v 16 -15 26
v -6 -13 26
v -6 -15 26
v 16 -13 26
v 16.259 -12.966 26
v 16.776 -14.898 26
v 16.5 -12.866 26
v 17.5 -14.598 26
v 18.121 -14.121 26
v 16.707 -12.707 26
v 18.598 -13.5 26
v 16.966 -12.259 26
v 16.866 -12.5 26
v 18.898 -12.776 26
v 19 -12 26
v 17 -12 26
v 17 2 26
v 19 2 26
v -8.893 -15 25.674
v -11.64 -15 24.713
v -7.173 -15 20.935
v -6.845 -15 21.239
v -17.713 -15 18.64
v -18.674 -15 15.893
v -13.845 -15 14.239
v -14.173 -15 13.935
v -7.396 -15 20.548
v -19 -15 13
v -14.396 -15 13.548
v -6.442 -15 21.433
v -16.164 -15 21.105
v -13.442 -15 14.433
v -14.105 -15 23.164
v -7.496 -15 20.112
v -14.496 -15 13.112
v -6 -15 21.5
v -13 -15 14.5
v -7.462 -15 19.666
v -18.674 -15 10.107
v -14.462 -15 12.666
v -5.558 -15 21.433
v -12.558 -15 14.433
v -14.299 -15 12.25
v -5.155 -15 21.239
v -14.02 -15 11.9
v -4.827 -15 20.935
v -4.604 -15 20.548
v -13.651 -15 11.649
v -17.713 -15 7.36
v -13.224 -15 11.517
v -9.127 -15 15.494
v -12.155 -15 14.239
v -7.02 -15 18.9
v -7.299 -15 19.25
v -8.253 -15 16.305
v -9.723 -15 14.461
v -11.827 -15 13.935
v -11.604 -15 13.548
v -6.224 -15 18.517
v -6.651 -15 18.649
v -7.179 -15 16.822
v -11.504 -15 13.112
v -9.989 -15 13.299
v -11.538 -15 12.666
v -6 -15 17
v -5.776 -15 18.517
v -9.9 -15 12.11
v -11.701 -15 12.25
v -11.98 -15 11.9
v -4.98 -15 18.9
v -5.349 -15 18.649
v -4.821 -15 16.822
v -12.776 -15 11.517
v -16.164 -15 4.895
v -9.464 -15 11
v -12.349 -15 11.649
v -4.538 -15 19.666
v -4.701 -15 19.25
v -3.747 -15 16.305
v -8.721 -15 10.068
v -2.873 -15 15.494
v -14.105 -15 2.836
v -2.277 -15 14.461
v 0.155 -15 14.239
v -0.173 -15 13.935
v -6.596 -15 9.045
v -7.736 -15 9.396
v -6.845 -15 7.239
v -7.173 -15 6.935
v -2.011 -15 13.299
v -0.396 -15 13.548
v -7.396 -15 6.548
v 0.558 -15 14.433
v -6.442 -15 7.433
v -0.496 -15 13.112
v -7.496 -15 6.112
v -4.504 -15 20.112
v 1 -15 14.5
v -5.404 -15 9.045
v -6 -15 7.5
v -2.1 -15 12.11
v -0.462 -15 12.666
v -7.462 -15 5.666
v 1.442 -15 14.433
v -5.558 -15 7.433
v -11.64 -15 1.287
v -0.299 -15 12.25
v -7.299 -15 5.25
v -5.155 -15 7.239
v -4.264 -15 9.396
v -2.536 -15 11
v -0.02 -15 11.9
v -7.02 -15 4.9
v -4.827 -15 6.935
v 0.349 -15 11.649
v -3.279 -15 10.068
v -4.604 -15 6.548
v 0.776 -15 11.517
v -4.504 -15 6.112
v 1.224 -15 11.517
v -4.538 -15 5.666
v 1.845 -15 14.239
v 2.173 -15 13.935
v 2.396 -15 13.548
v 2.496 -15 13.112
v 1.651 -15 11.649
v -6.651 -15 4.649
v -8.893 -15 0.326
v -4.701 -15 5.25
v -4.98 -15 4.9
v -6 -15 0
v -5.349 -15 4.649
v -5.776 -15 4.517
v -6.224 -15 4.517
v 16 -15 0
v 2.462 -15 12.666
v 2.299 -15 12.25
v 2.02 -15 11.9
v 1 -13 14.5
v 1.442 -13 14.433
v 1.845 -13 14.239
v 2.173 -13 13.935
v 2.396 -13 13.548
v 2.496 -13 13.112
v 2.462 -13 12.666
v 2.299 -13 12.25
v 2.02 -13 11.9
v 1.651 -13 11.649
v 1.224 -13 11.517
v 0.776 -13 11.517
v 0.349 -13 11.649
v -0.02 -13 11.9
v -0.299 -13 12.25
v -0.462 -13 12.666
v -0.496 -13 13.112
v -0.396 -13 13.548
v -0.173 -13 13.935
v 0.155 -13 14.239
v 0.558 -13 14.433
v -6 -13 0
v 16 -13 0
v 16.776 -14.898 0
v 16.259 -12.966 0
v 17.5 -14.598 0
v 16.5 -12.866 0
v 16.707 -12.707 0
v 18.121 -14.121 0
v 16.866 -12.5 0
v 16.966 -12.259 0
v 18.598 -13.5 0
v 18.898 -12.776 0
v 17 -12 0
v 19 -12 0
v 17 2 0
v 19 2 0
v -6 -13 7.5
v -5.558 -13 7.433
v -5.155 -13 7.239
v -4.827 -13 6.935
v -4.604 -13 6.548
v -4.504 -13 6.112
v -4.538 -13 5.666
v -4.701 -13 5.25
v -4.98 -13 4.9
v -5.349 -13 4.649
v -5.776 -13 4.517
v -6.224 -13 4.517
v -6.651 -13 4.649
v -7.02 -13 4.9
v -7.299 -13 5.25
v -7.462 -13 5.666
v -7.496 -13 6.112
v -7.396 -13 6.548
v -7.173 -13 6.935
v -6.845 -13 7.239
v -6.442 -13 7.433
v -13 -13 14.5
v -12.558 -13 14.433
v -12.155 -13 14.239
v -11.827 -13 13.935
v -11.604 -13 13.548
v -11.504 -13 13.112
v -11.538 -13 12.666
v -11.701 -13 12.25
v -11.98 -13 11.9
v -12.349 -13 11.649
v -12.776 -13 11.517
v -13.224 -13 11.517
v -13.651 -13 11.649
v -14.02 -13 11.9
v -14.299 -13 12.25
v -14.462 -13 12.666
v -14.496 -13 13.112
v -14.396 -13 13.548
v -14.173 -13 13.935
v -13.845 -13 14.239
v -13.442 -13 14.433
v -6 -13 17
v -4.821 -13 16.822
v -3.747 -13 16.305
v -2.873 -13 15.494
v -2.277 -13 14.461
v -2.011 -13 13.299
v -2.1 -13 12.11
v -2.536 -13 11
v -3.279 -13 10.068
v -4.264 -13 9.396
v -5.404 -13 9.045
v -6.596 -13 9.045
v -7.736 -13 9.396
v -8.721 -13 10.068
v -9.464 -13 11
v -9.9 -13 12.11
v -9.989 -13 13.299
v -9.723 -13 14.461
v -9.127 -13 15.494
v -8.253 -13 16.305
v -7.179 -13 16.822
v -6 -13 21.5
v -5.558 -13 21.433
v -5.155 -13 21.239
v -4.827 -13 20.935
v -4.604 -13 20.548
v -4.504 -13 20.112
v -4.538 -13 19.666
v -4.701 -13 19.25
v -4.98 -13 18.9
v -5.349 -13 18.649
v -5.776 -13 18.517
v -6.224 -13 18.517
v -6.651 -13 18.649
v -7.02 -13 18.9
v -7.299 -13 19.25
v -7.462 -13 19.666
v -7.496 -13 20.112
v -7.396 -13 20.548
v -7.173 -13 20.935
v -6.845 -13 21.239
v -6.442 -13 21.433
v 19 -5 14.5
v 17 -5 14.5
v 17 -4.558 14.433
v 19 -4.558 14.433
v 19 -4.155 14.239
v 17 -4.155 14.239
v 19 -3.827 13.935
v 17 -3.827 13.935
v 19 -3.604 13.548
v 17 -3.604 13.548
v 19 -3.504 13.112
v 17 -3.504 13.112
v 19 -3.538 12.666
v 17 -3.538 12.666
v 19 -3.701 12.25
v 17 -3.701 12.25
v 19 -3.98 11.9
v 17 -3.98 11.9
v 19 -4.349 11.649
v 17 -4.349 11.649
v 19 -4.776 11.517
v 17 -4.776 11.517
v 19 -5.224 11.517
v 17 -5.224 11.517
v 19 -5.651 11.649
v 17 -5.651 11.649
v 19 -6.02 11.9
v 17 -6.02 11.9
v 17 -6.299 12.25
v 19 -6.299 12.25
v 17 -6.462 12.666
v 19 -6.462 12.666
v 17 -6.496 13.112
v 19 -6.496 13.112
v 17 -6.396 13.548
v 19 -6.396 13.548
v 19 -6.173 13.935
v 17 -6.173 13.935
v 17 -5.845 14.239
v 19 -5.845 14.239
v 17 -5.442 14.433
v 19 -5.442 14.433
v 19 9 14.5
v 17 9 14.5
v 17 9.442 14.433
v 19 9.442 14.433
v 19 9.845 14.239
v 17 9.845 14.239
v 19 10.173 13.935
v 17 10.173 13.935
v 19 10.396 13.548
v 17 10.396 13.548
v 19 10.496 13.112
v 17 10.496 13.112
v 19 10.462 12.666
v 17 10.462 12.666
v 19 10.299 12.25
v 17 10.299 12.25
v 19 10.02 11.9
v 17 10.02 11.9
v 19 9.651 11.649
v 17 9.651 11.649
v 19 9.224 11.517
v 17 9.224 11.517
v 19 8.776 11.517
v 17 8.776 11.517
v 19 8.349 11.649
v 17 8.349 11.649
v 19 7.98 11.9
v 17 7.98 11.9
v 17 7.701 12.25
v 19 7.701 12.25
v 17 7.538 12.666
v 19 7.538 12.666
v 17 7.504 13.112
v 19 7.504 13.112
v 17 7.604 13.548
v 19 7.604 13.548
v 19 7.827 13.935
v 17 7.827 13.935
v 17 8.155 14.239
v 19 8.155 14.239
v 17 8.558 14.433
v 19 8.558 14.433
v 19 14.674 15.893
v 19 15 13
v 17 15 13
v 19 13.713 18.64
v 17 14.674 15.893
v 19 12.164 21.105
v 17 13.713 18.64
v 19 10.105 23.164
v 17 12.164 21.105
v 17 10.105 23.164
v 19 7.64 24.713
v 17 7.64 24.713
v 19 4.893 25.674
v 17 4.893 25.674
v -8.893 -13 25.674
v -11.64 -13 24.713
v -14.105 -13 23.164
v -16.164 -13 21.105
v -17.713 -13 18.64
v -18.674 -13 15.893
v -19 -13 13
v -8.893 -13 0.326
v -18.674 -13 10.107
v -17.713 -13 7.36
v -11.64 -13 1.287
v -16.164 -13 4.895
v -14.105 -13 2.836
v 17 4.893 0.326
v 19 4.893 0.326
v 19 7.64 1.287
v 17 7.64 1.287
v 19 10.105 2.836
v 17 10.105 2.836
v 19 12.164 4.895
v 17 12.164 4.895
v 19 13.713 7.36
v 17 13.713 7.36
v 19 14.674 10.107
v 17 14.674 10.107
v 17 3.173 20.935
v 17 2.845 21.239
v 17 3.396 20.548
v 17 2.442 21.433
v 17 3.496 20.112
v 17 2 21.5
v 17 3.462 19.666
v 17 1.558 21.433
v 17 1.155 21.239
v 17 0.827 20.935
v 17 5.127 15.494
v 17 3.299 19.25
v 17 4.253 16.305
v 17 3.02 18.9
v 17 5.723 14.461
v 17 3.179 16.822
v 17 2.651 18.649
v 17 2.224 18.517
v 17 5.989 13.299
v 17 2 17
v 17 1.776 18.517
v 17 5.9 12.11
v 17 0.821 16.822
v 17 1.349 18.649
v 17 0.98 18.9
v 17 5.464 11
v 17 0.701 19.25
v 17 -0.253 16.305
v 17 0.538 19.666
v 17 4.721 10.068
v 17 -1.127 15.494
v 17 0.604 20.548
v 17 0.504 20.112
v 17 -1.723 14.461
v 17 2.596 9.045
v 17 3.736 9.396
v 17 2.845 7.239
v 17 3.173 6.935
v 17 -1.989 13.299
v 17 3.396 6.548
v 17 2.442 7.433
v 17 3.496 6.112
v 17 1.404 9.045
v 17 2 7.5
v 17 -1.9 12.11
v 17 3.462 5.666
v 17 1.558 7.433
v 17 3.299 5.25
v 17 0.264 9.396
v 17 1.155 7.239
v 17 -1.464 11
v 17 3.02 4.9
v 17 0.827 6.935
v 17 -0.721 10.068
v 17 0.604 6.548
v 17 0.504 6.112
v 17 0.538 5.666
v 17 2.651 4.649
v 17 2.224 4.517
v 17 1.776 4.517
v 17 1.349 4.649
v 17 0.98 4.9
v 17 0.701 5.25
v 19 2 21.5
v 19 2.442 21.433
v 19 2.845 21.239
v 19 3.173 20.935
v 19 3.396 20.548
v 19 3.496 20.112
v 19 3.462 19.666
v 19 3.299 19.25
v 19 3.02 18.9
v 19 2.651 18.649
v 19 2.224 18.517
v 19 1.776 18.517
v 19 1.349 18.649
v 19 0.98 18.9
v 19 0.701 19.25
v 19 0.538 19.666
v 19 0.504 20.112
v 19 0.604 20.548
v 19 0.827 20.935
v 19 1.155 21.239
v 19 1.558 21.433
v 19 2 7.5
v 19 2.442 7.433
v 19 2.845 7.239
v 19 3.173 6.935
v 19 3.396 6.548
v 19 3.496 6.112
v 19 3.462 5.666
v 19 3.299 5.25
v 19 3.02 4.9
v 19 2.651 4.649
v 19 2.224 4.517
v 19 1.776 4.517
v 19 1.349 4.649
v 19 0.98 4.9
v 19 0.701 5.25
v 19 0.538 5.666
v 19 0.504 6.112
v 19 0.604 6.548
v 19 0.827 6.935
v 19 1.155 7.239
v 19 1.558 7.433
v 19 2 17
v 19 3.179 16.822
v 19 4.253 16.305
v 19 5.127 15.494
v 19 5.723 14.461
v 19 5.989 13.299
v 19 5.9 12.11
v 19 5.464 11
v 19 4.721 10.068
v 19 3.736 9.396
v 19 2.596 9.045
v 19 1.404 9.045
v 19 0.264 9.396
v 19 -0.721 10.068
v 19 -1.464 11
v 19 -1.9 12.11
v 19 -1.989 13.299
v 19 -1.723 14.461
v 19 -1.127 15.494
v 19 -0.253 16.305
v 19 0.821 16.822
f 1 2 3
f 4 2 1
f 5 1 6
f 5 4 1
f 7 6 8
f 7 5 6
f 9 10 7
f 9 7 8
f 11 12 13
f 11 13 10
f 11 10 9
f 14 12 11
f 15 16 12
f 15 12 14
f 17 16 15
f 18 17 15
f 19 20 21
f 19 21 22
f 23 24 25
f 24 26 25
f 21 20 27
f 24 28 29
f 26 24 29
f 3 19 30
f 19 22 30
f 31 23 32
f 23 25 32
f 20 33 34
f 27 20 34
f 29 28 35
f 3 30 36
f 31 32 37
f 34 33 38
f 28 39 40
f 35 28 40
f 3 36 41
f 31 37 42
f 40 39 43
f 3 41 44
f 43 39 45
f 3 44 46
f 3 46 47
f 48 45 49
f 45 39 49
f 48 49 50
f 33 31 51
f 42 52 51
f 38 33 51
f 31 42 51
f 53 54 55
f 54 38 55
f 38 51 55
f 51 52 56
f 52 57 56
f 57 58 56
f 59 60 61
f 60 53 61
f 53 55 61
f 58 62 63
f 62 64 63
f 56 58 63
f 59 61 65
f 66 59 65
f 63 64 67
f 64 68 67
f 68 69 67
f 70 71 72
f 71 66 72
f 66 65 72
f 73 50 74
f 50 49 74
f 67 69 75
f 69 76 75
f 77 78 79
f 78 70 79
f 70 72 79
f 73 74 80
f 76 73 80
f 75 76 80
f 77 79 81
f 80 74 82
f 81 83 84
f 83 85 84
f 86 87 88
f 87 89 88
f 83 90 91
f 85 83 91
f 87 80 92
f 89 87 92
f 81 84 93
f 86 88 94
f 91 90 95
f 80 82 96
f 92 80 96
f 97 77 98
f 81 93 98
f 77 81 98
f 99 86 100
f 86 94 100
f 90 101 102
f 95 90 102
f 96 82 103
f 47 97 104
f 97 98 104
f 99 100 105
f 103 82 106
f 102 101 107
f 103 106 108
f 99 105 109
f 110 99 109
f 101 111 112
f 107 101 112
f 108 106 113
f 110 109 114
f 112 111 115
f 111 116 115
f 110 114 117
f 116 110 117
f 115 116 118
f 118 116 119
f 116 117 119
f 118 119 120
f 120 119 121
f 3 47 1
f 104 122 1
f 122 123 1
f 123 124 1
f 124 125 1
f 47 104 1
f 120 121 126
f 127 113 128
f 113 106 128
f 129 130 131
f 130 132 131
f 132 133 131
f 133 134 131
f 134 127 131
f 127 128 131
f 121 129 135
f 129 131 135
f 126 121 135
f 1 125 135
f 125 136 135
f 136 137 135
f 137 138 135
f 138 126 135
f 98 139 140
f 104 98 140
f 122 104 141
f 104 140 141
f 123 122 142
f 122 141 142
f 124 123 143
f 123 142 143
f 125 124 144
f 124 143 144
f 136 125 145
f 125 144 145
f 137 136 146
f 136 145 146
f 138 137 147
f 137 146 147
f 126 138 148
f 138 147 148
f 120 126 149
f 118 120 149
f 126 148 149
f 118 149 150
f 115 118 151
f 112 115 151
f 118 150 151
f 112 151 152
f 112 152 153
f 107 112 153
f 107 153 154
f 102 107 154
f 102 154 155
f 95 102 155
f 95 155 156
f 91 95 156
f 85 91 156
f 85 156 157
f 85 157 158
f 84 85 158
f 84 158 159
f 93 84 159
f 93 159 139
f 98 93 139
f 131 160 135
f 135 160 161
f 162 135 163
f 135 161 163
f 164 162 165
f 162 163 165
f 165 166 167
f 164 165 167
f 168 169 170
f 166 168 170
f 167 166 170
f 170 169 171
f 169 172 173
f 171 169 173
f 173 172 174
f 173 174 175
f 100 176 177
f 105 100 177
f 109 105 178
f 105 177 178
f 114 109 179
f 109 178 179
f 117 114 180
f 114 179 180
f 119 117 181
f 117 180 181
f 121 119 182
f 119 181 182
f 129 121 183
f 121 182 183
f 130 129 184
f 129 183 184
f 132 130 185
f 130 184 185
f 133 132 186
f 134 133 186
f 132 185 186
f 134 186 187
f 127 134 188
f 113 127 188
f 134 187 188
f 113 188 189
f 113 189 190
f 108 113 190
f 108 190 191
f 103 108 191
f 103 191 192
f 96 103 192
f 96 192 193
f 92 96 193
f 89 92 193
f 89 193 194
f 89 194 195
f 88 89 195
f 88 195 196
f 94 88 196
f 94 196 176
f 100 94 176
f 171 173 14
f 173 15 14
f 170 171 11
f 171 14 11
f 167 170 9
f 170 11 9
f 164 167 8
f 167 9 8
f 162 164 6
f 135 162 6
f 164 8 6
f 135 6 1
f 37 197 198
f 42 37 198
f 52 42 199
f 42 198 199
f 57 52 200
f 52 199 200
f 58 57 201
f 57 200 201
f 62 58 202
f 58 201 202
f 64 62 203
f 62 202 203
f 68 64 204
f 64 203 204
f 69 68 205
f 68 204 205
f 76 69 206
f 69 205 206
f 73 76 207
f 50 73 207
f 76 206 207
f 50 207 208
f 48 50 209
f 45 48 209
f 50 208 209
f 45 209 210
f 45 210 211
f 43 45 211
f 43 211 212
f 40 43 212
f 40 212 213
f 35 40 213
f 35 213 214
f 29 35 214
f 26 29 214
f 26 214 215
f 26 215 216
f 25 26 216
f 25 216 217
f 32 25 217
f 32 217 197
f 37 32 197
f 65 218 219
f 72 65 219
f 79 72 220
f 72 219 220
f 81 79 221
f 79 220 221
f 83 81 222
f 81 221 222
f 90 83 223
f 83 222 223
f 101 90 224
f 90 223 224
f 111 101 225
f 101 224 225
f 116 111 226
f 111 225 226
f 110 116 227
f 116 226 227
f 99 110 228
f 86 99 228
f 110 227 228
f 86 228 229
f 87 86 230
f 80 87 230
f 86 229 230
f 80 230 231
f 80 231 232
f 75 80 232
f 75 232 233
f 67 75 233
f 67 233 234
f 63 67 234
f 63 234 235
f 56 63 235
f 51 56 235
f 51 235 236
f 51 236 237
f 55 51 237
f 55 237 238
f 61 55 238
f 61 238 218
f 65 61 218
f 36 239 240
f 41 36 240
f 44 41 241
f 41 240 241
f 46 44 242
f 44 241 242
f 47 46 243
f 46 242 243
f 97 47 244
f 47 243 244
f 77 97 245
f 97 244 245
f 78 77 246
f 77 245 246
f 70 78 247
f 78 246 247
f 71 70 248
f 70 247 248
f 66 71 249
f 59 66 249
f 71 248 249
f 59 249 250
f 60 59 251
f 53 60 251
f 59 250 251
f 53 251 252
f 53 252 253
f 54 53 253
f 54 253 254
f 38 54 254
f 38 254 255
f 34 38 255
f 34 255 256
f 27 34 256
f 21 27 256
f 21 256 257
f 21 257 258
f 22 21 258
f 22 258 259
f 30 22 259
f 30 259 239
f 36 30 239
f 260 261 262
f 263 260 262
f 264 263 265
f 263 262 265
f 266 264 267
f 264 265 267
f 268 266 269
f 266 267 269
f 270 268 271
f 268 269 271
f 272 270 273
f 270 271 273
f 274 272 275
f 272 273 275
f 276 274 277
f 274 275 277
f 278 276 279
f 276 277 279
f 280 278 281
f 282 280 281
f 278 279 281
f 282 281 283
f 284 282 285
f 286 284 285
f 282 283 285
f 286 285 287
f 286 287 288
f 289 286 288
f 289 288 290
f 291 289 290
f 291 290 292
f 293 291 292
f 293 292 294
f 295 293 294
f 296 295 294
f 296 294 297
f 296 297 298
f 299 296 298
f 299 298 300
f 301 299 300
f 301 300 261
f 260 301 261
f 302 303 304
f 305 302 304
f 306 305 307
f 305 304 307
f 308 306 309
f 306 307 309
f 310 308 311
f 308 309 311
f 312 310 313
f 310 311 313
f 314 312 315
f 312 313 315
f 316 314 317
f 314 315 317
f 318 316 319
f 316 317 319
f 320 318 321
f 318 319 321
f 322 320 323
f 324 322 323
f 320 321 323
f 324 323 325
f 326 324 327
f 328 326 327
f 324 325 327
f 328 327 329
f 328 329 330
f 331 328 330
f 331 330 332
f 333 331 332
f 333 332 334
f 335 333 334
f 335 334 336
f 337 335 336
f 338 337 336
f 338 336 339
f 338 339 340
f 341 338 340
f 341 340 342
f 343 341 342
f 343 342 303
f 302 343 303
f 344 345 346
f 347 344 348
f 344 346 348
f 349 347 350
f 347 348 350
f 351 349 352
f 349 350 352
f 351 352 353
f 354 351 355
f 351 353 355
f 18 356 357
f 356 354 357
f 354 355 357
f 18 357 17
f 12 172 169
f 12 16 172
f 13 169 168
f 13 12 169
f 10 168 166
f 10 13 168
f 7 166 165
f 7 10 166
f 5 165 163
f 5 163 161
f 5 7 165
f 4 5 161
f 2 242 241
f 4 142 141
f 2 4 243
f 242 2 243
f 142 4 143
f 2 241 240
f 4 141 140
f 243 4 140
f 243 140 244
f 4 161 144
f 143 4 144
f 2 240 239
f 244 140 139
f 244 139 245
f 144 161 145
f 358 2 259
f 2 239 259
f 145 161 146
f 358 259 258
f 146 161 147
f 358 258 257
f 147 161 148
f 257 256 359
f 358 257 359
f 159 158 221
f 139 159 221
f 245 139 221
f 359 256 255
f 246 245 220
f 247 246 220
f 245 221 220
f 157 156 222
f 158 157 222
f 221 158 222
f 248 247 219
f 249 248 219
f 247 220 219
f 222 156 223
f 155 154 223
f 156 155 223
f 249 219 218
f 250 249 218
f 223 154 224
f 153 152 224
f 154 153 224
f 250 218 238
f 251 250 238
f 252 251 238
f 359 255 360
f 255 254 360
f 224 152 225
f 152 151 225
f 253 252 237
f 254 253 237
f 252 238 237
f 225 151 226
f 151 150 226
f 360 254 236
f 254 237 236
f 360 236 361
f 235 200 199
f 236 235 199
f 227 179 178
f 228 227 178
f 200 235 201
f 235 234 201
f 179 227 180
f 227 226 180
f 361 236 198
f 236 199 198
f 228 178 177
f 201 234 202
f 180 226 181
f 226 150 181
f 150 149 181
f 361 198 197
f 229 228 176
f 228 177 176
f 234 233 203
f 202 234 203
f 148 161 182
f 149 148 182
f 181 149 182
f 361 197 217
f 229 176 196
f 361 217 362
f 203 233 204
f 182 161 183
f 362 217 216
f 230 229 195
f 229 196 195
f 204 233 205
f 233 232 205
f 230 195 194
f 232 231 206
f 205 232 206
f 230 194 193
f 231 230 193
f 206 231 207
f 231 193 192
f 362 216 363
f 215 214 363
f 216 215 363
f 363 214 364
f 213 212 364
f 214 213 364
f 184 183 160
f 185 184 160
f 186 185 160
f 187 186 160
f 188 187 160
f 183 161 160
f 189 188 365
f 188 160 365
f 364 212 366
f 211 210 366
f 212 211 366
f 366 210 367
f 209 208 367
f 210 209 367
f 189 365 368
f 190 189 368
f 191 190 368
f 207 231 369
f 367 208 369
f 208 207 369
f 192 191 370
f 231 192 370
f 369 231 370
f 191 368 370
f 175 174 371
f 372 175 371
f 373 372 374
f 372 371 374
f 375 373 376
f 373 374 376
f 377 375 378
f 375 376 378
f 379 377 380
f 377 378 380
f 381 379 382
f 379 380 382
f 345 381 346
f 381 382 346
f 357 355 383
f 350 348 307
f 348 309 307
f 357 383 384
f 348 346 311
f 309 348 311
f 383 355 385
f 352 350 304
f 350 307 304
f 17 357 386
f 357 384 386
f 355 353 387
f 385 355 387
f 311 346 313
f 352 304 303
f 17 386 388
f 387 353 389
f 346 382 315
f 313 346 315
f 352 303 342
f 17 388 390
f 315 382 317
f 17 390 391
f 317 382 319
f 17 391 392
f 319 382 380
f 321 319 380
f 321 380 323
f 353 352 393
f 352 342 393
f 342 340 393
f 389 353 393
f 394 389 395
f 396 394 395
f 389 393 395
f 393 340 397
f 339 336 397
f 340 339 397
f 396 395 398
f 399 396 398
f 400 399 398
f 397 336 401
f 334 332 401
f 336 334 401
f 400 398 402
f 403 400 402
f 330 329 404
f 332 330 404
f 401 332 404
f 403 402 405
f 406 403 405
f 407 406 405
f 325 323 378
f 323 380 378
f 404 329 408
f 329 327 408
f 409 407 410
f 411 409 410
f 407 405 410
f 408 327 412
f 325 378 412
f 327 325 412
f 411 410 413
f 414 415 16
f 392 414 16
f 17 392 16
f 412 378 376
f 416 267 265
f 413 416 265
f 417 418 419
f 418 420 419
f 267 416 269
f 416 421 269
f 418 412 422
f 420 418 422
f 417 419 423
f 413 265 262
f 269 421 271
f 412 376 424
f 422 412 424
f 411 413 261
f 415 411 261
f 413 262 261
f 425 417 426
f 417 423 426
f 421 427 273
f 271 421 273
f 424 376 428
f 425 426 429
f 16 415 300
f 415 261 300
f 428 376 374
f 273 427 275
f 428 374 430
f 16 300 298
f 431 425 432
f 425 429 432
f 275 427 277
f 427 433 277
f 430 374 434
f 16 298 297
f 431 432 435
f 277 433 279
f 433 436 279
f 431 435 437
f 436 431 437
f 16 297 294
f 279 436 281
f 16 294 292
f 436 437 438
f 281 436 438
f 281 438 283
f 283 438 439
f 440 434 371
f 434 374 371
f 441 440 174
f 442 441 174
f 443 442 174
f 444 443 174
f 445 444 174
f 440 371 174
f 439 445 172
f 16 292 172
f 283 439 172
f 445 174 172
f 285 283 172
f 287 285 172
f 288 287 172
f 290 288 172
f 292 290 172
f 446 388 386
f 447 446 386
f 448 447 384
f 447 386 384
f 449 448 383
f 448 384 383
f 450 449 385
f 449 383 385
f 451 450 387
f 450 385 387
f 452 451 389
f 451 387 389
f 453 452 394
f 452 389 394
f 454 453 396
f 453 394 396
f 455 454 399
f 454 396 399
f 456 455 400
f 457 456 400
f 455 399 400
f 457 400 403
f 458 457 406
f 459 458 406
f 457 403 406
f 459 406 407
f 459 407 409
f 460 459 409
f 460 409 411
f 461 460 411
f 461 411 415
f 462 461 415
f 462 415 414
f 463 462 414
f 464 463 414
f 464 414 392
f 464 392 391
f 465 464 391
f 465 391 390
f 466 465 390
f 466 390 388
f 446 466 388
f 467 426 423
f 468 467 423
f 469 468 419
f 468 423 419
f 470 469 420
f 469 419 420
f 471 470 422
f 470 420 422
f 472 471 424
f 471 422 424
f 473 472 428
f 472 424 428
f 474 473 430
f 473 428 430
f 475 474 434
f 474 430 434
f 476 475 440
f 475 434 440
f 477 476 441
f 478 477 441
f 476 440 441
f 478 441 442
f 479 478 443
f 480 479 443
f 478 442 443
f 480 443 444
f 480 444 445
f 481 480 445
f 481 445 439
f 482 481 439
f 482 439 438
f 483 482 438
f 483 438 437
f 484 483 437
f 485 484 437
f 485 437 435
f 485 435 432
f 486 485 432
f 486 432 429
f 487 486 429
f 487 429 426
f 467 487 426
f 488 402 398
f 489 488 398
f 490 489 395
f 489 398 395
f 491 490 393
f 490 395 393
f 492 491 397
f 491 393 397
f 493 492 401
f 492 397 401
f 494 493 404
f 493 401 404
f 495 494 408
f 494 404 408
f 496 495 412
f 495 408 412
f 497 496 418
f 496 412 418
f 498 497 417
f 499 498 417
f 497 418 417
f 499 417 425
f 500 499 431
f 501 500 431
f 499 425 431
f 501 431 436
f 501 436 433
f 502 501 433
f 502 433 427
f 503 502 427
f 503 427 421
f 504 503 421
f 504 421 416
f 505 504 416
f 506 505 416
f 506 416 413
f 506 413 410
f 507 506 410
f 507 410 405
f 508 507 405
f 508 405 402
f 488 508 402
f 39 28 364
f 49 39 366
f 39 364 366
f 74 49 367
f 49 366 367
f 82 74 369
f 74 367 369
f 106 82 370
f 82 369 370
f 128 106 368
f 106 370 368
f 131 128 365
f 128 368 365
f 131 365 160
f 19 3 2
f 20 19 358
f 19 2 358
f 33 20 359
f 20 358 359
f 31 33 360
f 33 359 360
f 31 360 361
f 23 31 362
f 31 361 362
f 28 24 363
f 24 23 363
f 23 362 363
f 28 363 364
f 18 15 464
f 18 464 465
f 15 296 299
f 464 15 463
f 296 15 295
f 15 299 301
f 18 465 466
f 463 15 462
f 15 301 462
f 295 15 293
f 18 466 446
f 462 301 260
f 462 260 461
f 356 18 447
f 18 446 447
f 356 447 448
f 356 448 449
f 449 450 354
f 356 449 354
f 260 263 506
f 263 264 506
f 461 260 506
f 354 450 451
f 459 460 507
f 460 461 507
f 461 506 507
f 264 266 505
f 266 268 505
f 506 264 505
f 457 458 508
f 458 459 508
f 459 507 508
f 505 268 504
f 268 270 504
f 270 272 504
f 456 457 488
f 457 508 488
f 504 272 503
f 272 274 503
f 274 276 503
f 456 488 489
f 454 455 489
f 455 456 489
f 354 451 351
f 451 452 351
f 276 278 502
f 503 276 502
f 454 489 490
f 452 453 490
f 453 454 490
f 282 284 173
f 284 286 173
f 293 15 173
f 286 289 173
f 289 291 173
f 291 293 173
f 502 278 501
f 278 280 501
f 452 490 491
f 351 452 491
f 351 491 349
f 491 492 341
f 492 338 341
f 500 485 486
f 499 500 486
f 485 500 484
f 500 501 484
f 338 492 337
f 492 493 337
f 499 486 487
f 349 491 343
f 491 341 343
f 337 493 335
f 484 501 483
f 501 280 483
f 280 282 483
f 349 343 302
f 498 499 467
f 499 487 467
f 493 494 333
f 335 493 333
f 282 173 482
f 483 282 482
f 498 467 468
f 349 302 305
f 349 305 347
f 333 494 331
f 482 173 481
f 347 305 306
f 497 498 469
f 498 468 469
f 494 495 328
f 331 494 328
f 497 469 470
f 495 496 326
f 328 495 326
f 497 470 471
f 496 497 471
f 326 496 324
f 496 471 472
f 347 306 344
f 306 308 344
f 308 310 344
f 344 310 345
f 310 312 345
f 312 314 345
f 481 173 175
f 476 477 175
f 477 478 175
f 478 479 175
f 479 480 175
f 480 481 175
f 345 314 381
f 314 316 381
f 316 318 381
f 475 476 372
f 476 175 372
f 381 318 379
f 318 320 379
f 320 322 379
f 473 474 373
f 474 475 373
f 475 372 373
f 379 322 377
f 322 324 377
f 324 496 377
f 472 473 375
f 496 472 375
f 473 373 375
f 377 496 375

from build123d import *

# Parameters (mm, degrees)
EXTRUDE_1_DEPTH     = 26
FILLET_1_R          = 1
FILLET_2_R          = 3
SKETCH_2_R          = 1.5
SKETCH_2_R_2        = 4
CUT_EXTRUDE_1_DEPTH = 26
SKETCH_3_R          = 1.5
SKETCH_3_R_2        = 4
CUT_EXTRUDE_2_DEPTH = 26


with BuildPart() as part:
    # 草图1 → 凸台-拉伸1 (new body)
    with BuildSketch(Plane.XY):
        Polygon((-19, -15), (19, -15), (19, 15), (17, 15), (17, -13), (-19, -13), align=None)
    extrude(amount=EXTRUDE_1_DEPTH)

    # 圆角1
    fillet_1_edges = [part.edges().sort_by_distance(p)[0] for p in [
        (17, -13, 13),
    ]]
    fillet(fillet_1_edges, radius=FILLET_1_R)

    # 圆角2
    fillet_2_edges = [part.edges().sort_by_distance(p)[0] for p in [
        (19, -15, 13),
    ]]
    fillet(fillet_2_edges, radius=FILLET_2_R)

    # 草图2 → 切除-拉伸1 (cut)
    with BuildSketch(Plane.ZY.offset(-17)):
        with BuildLine():
            Line((26, 15), (13, 15))
            ThreePointArc((13, 15), (22.192388155, 11.192388155), (26, 2))
            Line((26, 2), (26, 15))
        make_face()
        with BuildLine():
            Line((0, 15), (0, 2))
            ThreePointArc((0, 2), (3.807611845, 11.192388155), (13, 15))
            Line((13, 15), (0, 15))
        make_face()
        with Locations((6, 2)):
            Circle(SKETCH_2_R)
        with Locations((13, 9)):
            Circle(SKETCH_2_R)
        with Locations((13, -5)):
            Circle(SKETCH_2_R)
        with Locations((20, 2)):
            Circle(SKETCH_2_R)
        with Locations((13, 2)):
            Circle(SKETCH_2_R_2)
    extrude(amount=-CUT_EXTRUDE_1_DEPTH, mode=Mode.SUBTRACT)

    # 草图3 → 切除-拉伸2 (cut)
    with BuildSketch(Plane(origin=(0, -13, 0), x_dir=(1, 0, 0), z_dir=(0, 1, 0))):
        with BuildLine():
            ThreePointArc((-19, -13), (-15.192388155, -3.807611845), (-6, 0))
            Line((-6, 0), (-19, 0))
            Line((-19, 0), (-19, -13))
        make_face()
        with Locations(Location((-6, -6, 0), (0, 0, 270))):
            Circle(SKETCH_3_R)
        with Locations(Location((-6, -13, 0), (0, 0, 270))):
            Circle(SKETCH_3_R_2)
        with Locations(Location((1, -13, 0), (0, 0, 270))):
            Circle(SKETCH_3_R)
        with Locations(Location((-13, -13, 0), (0, 0, 270))):
            Circle(SKETCH_3_R)
        with Locations(Location((-6, -20, 0), (0, 0, 270))):
            Circle(SKETCH_3_R)
        with BuildLine():
            ThreePointArc((-6, -26), (-15.192388155, -22.192388155), (-19, -13))
            Line((-19, -13), (-19, -26))
            Line((-19, -26), (-6, -26))
        make_face()
    extrude(amount=-CUT_EXTRUDE_2_DEPTH, mode=Mode.SUBTRACT)


solid = part.part
